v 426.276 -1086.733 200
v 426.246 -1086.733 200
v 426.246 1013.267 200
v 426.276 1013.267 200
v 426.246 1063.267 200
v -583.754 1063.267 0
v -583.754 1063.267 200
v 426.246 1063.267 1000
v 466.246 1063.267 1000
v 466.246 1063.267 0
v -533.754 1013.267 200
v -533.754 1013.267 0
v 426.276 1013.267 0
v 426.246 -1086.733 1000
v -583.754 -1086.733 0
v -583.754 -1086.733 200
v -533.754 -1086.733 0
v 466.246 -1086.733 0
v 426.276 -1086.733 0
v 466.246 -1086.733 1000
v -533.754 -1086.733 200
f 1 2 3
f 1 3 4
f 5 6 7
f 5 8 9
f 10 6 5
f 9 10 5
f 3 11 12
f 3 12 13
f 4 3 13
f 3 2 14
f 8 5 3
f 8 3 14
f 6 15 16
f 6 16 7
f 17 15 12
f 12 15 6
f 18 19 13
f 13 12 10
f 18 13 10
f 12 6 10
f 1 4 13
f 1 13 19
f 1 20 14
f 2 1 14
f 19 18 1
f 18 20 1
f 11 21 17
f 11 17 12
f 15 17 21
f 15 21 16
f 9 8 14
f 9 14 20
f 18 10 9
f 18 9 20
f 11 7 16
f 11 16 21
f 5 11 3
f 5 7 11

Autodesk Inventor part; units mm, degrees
ref_plane "YZ Plane" through (0, 0, 0) normal (1, 0, 0) x (0, 1, 0)
ref_plane "XZ Plane" through (0, 0, 0) normal (0, 1, 0) x (-1, 0, 0)
ref_plane "XY Plane" through (0, 0, 0) normal (0, 0, 1) x (1, 0, 0)
sketch "Esquisse1" plane through (0, 0, 0) normal (0, 0, 1) x (1, 0, 0)
  line L0 (-583.7545, 1063.2671) -> (466.2455, 1063.2671)
  line L1 (466.2455, 1063.2671) -> (466.2455, -1086.7329)
  line L2 (466.2455, -1086.7329) -> (-583.7545, -1086.7329)
  line L3 (-583.7545, -1086.7329) -> (-583.7545, 1063.2671)
  point P0 (0, 0)
  dimension "d0" = 1050
  dimension "d1" = 2150
extrude "Extrusion1" add sketch "Esquisse1" along normal blind 1000
sketch "Esquisse2" plane through (-583.7545, 1063.2671, 0) normal (0, 1, 0) x (1, 0, 0)
  line L0 (0, 0) -> (0, -1000) projected
  line L1 (1050, -1000) -> (0, -1000) projected
  line L2 (0, -200) -> (1010, -200)
  line L3 (1010, -200) -> (1010, -1000)
  line L4 (1010, -1000) -> (0, -1000)
  line L5 (0, -1000) -> (0, -200)
  line L6 (1050, 0) -> (1050, -1000) projected
  point P0 (583.7545, 0)
  dimension "d4" = 200
  dimension "d5" = 40
extrude "Extrusion2" cut sketch "Esquisse2" against normal through all
sketch "Esquisse3" plane through (-583.7545, 1063.2671, 200) normal (0, 0, 1) x (1, 0, 0)
  line L0 (1050, -2150) -> (0, -2150) projected
  line L1 (50, -50) -> (1010.0305, -50)
  line L2 (1010.0305, -50) -> (1010.0305, -2150)
  line L3 (1010.0305, -2150) -> (50, -2150)
  line L4 (50, -2150) -> (50, -50)
  line L5 (0, -2150) -> (0, 0) projected
  point P0 (583.7545, -1063.2671)
  dimension "d8" = 50
  dimension "d9" = 50
extrude "Extrusion3" cut sketch "Esquisse3" against normal through all
properties part number "Porte Simple" material "Bois (Chêne)"
